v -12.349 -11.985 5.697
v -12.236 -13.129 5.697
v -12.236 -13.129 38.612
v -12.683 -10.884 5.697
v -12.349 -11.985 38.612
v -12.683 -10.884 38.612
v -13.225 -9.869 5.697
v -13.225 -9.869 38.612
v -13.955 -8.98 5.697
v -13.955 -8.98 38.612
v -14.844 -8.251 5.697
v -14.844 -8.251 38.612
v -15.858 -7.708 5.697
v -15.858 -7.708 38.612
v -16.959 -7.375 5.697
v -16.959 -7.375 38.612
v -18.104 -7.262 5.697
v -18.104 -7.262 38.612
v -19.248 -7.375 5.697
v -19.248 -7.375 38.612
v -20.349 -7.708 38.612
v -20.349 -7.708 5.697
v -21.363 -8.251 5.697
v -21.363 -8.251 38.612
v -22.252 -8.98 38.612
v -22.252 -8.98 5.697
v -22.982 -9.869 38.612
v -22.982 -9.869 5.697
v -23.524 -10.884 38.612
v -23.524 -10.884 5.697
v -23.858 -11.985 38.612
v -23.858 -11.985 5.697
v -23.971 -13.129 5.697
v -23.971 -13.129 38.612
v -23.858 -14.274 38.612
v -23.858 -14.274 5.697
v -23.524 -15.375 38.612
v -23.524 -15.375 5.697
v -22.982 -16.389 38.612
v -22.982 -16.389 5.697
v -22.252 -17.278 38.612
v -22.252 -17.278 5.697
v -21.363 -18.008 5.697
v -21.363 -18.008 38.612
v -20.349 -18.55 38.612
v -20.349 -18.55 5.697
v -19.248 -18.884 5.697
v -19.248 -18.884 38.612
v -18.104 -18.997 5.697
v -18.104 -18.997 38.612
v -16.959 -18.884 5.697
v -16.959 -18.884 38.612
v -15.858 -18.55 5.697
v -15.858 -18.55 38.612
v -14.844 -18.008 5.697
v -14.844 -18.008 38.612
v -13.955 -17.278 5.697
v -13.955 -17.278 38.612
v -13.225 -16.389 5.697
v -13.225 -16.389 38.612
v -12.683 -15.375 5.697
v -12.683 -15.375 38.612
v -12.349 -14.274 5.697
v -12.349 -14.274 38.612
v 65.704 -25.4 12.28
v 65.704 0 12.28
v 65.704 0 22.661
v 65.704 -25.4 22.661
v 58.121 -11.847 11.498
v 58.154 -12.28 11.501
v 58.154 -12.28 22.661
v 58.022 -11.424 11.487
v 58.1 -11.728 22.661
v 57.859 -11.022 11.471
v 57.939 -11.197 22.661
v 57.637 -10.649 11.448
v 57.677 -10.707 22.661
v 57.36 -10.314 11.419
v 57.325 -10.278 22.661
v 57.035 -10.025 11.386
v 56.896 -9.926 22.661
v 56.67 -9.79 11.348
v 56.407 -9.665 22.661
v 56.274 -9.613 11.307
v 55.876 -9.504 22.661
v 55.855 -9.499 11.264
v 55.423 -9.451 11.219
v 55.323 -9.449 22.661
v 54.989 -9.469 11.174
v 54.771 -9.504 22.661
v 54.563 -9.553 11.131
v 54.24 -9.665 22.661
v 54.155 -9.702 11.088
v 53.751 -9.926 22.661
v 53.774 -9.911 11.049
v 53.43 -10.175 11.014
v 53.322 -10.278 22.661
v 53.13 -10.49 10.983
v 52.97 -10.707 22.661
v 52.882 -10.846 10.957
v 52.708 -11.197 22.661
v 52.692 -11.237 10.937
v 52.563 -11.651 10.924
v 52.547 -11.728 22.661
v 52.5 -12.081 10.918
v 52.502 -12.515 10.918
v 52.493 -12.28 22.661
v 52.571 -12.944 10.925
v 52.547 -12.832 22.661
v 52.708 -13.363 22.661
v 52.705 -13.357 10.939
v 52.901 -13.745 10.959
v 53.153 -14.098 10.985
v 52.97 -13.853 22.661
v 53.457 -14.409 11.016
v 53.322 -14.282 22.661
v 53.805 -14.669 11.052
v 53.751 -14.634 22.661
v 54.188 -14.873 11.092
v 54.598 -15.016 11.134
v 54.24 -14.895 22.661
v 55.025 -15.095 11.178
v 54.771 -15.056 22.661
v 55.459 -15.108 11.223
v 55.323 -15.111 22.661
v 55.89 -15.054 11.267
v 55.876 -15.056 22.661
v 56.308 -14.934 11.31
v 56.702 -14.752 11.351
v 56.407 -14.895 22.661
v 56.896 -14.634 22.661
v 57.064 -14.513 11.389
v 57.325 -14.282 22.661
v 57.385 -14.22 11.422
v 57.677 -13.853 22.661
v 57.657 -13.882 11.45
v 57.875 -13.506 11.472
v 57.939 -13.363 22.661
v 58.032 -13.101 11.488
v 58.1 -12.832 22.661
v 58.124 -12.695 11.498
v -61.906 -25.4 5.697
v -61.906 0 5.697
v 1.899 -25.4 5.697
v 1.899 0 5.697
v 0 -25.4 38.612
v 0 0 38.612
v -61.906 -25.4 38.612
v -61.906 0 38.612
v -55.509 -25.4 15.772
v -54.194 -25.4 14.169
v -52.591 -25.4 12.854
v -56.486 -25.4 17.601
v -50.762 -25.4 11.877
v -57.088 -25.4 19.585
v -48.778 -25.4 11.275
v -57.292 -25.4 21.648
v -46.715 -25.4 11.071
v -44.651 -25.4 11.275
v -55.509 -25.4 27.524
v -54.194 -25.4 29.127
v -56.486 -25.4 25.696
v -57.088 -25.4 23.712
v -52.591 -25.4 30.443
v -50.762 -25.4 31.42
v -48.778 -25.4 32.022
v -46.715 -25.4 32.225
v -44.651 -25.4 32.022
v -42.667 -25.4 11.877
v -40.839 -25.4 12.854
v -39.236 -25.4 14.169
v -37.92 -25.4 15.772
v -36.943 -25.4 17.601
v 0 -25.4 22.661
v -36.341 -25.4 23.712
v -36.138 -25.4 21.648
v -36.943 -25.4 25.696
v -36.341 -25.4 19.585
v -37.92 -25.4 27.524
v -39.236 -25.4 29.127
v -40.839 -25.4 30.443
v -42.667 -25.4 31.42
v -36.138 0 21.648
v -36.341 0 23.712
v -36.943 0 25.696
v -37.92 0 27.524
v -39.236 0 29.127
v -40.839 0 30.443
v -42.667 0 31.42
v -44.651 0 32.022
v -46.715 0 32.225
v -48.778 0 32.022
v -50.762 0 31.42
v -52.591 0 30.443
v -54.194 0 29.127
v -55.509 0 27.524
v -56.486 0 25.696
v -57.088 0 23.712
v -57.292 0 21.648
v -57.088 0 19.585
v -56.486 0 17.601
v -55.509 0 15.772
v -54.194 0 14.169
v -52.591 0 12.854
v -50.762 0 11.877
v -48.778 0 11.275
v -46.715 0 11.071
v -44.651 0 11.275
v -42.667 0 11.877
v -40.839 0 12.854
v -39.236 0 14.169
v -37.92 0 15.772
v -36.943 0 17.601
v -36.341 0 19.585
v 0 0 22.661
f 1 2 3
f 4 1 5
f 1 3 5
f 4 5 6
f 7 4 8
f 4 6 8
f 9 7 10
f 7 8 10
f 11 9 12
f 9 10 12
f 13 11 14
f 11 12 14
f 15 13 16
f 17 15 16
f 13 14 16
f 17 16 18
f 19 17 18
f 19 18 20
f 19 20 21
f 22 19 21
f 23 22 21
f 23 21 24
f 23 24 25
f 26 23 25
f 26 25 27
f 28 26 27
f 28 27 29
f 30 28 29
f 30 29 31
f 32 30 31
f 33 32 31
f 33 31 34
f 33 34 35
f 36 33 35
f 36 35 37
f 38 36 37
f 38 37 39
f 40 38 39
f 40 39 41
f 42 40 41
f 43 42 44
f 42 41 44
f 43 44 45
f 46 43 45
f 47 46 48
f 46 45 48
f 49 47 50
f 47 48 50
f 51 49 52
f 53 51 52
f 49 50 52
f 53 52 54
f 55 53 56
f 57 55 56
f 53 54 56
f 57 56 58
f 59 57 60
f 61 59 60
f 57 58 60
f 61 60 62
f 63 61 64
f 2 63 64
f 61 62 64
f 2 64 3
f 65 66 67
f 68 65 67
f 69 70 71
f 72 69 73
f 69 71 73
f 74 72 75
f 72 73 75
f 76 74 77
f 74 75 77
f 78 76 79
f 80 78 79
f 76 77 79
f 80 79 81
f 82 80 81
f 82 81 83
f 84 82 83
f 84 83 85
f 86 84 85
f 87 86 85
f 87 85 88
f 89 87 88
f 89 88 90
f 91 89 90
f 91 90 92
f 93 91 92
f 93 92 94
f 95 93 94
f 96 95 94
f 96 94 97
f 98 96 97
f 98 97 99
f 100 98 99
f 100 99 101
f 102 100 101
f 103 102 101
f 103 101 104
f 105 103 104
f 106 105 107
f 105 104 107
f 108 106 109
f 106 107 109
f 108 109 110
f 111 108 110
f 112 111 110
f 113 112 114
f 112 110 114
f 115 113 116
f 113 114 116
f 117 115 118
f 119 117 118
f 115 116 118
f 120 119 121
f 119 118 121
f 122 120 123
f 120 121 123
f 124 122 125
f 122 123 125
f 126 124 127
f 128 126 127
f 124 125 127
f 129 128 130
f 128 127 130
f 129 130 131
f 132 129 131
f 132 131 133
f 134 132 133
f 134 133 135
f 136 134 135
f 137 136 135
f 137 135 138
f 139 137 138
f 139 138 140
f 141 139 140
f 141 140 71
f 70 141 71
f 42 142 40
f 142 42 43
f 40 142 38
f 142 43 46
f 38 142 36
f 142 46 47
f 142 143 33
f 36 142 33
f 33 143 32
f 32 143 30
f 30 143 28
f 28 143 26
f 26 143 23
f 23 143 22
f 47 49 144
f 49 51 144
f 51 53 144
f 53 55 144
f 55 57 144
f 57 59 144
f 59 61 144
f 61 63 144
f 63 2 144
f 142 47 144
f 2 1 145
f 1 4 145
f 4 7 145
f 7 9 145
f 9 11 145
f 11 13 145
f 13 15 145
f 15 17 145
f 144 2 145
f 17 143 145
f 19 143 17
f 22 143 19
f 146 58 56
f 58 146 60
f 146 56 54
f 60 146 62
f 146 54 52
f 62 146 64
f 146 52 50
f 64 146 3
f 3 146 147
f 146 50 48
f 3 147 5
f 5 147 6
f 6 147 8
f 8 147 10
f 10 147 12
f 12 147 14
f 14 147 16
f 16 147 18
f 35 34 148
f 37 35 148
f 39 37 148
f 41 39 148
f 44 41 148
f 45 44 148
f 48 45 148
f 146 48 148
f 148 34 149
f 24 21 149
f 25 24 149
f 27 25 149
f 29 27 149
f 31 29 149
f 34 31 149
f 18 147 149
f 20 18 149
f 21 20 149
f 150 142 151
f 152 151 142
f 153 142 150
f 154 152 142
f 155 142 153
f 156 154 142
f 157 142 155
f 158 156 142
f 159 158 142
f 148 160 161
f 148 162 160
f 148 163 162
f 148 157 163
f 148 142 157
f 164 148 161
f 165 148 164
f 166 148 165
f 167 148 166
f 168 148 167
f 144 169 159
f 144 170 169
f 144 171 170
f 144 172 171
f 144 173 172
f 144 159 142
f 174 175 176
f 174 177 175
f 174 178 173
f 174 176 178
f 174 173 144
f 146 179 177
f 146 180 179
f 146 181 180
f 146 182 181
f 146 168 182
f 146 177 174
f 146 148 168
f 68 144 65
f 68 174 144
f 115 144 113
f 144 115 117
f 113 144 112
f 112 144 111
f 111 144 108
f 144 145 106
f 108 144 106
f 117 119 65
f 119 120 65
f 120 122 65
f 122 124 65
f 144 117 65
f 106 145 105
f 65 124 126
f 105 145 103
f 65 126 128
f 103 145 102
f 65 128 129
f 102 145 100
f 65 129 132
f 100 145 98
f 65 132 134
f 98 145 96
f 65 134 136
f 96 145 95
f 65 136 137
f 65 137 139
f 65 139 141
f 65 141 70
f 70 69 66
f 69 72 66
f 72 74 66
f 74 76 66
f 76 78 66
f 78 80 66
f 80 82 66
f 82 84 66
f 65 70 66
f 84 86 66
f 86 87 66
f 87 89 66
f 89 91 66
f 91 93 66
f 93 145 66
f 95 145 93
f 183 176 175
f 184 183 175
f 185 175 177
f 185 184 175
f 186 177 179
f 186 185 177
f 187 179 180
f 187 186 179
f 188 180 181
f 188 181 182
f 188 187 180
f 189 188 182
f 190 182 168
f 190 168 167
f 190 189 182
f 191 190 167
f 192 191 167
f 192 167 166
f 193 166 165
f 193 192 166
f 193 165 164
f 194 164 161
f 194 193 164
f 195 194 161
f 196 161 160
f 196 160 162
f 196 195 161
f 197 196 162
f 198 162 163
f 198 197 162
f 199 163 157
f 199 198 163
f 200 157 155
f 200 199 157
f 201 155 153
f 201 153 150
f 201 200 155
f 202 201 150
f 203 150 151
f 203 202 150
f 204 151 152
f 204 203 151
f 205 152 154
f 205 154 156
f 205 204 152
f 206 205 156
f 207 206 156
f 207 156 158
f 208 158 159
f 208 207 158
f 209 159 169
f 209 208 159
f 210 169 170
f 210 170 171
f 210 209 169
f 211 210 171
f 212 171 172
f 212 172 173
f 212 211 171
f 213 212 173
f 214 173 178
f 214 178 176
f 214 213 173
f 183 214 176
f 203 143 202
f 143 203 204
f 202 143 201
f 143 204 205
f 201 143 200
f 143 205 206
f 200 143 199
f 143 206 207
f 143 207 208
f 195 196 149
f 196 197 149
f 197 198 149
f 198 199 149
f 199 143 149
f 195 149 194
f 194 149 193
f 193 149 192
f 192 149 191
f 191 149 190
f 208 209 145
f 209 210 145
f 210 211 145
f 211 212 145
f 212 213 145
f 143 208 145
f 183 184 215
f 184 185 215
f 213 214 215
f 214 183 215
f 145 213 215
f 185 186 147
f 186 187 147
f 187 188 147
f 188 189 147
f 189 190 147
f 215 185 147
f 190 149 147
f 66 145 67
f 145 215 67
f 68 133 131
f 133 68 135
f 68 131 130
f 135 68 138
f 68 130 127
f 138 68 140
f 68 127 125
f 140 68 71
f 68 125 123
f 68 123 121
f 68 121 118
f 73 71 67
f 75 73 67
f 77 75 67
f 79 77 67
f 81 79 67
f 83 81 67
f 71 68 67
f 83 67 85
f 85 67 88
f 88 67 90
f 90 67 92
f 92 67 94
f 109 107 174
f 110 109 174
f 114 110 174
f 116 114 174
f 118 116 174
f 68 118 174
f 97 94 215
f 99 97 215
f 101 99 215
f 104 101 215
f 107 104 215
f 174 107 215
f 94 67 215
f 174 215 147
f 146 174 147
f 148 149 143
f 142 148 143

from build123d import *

# Parameters (mm, degrees)
F0_R     = 10.5768156475
F1_DEPTH = 25.4
F2_R     = 5.8673814398
F3_DEPTH = 32.9165069776
F5_R     = 2.8308188493
F6_DEPTH = 16.9651473331


# Not quite as in the source:
# - a feature names something its author has since deleted; it is built from what else it names


with BuildPart() as f1:
    # F0 (on Front) → F1 (new body)
    with BuildSketch(Plane.XZ):
        Polygon((0, 38.612421602), (-61.9064718485, 38.612421602), (-61.9064718485, 5.6969146244), (1.8989704549, 5.6969146244), (65.7044127584, 12.2800152749), (65.7044127584, 22.1546681132), (65.7044127584, 22.6610619575), (0, 22.6610619575), align=None)
        with Locations((-46.7147007585, 21.6482765973)):
            Circle(F0_R, mode=Mode.SUBTRACT)
    extrude(amount=F1_DEPTH)

    # F2 (on face) → F3 (cut, through all)
    with BuildSketch(Plane.XY.offset(38.612421602)):
        with Locations((-18.1035287678, -13.1292007864)):
            Circle(F2_R)
    extrude(amount=-F3_DEPTH, mode=Mode.SUBTRACT)

    # F5 (on face) → F6 (cut, through all)
    with BuildSketch(Plane.XY.offset(22.6610619575)):
        with Locations((55.3233735263, -12.2800152749)):
            Circle(F5_R)
    extrude(amount=-F6_DEPTH, mode=Mode.SUBTRACT)


solid = f1.part
